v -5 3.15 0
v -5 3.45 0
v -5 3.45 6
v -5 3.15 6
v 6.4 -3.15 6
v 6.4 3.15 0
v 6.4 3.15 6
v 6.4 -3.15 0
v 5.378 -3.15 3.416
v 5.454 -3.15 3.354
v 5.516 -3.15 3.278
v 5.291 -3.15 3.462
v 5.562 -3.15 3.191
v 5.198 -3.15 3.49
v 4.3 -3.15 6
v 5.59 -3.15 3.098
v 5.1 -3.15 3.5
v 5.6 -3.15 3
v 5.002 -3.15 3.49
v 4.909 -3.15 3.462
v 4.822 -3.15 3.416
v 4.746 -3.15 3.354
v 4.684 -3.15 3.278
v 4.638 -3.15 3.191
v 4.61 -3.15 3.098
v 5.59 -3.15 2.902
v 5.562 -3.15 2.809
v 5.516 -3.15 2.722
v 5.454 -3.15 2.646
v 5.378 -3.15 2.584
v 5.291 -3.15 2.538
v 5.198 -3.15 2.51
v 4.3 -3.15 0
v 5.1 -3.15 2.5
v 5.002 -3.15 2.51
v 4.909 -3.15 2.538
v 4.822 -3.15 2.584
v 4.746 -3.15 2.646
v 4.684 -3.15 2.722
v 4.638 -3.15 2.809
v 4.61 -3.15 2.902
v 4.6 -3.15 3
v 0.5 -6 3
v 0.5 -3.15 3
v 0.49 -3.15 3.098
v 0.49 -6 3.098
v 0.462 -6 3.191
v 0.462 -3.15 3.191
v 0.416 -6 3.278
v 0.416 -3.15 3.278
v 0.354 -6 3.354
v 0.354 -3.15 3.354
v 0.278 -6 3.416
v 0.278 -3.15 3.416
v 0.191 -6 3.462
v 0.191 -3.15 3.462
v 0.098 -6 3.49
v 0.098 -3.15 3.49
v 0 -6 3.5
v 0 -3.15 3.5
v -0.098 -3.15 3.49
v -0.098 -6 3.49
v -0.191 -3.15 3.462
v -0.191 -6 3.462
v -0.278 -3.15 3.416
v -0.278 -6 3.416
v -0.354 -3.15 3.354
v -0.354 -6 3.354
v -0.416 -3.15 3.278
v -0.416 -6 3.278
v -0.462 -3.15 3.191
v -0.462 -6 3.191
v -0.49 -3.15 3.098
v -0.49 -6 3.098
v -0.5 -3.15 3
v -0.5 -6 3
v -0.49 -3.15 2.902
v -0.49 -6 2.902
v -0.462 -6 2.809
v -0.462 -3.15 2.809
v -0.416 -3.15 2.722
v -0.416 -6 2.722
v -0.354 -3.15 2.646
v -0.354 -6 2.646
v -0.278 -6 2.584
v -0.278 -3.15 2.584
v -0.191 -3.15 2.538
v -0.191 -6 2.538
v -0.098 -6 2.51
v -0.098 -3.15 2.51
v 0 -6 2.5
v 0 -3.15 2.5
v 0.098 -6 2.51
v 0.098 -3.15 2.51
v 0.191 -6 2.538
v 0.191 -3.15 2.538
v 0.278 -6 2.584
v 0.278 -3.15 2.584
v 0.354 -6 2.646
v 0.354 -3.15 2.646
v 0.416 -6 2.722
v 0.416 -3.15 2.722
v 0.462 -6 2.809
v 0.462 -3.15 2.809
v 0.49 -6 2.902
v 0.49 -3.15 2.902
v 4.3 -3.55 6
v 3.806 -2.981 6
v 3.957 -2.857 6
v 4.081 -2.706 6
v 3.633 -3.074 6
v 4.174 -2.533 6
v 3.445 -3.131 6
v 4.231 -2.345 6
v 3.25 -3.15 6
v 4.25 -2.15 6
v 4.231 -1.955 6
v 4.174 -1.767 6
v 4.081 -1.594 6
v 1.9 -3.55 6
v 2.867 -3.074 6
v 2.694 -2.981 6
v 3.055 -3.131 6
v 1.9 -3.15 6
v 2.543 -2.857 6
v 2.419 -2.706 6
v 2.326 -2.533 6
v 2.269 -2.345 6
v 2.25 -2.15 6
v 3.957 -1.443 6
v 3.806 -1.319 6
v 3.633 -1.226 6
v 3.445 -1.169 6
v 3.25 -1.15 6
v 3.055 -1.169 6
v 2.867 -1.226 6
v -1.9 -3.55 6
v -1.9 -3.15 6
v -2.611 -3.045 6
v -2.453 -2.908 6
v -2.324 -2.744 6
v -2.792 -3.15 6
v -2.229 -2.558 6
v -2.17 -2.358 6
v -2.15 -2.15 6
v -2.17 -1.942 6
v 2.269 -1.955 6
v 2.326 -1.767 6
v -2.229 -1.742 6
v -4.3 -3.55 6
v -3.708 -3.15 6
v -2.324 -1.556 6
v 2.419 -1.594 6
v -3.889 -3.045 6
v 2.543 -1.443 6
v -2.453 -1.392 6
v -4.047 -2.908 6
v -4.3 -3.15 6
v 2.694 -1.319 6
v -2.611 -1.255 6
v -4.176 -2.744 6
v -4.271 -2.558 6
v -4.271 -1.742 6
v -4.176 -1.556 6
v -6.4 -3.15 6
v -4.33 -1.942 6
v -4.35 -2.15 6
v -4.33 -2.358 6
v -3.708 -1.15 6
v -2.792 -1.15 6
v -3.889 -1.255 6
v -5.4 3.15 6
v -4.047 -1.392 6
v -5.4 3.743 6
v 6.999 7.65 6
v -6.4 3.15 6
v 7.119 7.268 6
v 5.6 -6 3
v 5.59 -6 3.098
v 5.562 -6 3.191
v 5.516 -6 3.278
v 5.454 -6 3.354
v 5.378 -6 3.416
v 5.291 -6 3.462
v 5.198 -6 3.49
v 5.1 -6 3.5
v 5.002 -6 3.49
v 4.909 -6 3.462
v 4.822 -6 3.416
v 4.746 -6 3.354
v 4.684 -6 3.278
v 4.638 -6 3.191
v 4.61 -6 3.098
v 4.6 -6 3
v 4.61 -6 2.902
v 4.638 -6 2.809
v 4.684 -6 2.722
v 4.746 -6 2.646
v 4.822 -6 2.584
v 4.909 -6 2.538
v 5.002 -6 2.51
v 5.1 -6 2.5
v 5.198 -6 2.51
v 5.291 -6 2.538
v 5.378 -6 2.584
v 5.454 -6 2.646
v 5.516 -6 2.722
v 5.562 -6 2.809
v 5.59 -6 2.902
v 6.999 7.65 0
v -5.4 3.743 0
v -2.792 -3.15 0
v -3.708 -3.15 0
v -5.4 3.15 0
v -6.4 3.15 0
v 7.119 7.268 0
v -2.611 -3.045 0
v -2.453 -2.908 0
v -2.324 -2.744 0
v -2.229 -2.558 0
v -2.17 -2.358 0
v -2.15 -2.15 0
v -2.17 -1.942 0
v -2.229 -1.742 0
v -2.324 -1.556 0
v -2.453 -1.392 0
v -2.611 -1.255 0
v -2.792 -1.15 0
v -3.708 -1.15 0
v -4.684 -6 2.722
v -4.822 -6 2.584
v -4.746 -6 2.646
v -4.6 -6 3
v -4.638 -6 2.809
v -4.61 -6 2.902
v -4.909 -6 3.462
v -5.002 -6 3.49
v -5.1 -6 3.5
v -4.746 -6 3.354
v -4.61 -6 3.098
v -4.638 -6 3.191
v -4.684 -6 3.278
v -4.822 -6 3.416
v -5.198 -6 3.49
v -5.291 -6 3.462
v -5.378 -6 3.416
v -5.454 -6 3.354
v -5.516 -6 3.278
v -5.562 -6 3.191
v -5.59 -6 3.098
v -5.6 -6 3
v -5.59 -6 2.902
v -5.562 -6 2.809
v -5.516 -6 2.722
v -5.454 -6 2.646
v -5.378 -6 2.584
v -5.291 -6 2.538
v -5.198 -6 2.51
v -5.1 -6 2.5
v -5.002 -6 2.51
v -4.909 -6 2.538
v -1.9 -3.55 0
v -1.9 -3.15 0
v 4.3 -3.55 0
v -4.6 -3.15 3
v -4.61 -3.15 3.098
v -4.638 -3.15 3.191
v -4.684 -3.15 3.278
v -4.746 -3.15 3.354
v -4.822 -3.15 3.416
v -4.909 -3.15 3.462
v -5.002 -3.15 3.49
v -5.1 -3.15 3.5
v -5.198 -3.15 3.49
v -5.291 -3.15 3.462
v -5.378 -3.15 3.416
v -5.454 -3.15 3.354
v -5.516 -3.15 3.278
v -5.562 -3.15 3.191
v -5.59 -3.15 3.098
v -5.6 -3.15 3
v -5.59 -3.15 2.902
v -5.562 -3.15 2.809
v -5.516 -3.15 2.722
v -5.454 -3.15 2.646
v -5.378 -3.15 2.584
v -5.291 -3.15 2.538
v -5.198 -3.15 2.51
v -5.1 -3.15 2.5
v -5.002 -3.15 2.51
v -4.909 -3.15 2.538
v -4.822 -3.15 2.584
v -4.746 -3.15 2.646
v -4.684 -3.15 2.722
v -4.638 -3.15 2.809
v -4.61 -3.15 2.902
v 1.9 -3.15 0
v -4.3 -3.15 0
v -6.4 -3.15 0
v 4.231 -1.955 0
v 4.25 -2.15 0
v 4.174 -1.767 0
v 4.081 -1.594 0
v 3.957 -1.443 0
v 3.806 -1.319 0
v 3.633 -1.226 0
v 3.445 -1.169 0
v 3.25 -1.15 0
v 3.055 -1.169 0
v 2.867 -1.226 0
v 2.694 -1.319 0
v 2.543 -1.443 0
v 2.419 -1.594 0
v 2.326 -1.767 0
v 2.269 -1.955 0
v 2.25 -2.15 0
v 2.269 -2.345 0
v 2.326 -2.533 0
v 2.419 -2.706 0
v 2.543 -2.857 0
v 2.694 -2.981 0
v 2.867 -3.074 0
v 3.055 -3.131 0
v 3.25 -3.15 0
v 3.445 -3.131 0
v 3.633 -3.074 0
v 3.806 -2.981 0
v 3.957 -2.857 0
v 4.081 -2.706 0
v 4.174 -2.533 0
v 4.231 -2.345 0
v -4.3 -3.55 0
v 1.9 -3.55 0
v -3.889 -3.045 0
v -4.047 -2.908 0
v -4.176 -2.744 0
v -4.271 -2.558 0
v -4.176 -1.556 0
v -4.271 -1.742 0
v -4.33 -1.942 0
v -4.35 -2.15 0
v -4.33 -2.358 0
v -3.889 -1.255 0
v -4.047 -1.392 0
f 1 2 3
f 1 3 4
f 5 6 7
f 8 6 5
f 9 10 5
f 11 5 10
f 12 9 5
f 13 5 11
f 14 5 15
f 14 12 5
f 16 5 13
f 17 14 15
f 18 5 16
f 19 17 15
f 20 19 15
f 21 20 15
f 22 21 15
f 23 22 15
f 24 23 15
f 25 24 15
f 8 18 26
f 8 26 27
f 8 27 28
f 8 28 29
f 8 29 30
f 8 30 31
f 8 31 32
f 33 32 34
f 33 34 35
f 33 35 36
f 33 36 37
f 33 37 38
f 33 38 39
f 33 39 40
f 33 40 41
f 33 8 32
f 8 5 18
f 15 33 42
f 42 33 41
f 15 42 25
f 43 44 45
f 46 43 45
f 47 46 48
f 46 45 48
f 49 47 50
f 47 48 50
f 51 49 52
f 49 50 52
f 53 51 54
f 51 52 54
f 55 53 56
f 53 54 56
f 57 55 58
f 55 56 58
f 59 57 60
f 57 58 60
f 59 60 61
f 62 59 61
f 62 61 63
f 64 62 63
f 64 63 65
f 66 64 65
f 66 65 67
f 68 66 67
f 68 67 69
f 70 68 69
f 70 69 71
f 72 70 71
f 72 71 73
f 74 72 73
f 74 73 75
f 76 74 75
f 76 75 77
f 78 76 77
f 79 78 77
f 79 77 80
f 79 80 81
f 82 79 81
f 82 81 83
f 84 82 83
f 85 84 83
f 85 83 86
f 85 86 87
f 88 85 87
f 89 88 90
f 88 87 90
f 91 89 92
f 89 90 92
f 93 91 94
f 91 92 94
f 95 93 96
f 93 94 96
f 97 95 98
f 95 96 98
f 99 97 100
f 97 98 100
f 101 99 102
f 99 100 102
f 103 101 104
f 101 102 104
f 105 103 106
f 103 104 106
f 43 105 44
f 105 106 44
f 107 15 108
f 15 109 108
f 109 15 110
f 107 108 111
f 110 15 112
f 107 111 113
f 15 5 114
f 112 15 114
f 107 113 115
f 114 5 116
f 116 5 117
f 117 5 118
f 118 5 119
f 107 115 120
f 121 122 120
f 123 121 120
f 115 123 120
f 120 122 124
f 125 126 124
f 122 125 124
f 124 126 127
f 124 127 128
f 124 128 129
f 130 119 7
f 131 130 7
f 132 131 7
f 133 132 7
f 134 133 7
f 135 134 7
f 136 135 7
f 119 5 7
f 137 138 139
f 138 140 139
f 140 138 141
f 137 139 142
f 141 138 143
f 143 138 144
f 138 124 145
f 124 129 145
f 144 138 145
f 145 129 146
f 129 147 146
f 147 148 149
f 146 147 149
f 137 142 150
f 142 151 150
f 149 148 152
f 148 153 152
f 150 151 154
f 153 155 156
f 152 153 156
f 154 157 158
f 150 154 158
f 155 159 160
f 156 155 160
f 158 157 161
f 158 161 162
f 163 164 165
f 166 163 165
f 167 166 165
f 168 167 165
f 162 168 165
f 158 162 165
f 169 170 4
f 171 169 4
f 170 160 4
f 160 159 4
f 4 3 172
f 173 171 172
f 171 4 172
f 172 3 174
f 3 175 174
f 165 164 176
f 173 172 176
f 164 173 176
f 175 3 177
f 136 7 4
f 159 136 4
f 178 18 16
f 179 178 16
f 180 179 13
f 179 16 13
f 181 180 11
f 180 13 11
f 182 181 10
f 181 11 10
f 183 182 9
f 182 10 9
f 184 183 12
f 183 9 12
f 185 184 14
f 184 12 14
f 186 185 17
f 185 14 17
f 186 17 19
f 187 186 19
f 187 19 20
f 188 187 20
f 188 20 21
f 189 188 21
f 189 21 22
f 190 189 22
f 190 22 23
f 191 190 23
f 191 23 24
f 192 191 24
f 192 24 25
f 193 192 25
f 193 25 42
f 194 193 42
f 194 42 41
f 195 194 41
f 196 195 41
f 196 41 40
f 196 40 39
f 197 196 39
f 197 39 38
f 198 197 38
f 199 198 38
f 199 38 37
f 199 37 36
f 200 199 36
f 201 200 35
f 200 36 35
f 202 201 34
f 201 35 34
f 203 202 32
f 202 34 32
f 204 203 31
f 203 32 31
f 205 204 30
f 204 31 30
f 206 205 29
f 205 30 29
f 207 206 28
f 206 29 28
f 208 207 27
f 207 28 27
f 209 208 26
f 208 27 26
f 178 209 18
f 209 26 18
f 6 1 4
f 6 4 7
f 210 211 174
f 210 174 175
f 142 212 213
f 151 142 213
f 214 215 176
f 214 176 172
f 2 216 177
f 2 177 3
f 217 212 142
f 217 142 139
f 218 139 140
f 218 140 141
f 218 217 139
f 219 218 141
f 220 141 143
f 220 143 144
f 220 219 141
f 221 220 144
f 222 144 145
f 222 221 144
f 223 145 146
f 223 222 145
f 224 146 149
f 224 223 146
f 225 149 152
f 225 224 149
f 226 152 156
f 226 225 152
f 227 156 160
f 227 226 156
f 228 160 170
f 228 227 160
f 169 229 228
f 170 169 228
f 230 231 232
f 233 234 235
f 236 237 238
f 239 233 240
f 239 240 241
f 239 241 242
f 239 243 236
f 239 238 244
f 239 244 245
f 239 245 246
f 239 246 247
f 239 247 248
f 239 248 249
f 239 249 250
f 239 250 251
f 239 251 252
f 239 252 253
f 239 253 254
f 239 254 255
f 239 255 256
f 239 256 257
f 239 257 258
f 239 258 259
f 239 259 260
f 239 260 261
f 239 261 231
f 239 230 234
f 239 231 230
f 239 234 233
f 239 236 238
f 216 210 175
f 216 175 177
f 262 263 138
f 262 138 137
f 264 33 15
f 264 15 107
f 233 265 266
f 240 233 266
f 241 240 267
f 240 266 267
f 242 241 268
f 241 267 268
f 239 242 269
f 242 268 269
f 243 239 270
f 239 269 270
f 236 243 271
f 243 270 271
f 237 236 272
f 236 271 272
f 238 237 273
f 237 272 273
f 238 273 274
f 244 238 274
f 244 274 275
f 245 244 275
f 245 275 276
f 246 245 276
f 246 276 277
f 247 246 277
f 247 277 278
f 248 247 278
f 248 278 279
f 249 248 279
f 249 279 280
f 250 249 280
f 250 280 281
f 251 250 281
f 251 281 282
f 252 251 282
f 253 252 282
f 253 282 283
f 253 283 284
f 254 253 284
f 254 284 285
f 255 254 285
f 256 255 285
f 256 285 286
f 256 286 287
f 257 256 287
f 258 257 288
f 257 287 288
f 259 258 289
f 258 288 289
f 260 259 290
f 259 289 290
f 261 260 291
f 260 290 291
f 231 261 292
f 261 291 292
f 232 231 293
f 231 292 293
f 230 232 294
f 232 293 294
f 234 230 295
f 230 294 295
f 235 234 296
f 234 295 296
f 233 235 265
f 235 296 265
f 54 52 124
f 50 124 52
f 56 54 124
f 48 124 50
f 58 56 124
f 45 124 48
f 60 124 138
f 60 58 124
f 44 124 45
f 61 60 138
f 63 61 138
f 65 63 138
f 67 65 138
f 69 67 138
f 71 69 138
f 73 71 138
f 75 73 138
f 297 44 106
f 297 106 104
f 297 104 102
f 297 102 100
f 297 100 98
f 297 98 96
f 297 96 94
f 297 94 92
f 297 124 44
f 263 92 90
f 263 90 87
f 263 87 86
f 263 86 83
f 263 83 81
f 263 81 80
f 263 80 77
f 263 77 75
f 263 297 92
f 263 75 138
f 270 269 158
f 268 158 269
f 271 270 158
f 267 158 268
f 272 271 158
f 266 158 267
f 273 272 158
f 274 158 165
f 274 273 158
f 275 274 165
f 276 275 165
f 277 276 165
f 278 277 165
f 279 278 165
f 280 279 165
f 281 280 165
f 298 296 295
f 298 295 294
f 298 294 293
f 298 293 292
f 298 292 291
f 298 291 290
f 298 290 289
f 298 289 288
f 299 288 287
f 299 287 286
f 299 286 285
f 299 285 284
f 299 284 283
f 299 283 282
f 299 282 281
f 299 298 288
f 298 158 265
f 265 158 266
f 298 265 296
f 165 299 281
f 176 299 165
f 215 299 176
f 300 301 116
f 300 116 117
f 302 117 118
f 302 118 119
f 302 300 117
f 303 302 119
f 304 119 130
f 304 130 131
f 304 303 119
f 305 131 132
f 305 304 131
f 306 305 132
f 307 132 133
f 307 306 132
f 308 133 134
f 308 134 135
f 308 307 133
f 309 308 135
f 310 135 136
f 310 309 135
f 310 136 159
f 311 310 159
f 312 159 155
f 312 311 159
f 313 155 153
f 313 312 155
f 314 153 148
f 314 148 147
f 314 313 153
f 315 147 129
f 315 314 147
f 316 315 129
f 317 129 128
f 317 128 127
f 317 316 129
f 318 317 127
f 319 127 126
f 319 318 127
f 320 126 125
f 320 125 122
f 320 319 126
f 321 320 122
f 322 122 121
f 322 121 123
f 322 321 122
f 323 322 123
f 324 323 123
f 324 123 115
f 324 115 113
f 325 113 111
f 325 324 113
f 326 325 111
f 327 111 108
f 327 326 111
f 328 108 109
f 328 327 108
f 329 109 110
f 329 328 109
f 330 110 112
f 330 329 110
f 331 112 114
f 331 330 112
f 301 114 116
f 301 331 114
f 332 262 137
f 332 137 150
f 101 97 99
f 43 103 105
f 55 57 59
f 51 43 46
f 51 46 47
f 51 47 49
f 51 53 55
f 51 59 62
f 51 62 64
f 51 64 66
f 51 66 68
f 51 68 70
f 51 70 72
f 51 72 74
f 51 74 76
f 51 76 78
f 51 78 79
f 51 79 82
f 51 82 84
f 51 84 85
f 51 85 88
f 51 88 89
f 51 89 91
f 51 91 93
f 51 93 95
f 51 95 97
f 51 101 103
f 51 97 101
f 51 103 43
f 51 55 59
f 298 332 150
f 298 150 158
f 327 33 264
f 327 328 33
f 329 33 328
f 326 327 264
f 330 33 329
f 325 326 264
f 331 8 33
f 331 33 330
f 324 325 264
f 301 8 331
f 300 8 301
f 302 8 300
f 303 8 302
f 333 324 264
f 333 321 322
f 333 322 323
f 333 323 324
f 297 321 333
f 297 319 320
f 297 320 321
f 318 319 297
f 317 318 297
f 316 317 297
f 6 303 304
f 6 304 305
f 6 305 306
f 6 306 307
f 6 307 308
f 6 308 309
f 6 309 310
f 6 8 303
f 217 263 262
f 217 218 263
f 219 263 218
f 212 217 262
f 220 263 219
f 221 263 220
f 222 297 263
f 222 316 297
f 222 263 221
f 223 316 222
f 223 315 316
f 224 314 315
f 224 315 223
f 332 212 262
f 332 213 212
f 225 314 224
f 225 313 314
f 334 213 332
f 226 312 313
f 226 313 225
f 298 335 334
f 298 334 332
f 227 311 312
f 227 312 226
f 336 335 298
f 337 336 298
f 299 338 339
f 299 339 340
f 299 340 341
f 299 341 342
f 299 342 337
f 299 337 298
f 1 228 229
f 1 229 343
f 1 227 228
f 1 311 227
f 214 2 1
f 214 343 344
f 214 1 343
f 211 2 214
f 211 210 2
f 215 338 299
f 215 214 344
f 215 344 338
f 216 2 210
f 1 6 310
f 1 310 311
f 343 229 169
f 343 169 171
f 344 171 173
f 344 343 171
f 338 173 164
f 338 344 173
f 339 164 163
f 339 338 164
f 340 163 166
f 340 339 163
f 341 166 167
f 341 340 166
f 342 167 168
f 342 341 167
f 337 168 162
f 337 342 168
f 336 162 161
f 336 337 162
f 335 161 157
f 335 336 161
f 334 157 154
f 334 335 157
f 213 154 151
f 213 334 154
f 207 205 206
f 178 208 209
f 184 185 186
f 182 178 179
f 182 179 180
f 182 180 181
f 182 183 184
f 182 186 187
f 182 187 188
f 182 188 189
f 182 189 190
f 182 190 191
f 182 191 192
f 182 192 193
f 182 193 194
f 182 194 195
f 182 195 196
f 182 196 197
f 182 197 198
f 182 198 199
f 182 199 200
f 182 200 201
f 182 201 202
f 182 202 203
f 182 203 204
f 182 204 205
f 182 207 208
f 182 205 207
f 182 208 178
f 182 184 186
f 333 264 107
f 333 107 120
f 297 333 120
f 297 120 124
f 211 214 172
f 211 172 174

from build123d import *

# Parameters (mm, degrees)
SKETCH001_R         = 1
PAD001_DEPTH        = 6
CYLINDER003_R       = 0.5
CYLINDER003_DEPTH   = 3
LINEARPATTERN_COUNT = 3
LINEARPATTERN_PITCH = 5.1


with BuildPart() as part:
    # Sketch001 → Pad001 (new body)
    with BuildSketch(Plane.XY):
        Polygon((6.4, 3.15), (6.4, -3.15), (4.3, -3.15), (4.3, -3.55), (1.9, -3.55), (1.9, -3.15), (-1.9, -3.15), (-1.9, -3.55), (-4.3, -3.55), (-4.3, -3.15), (-6.4, -3.15), (-6.4, 3.15), (-5.4, 3.15), (-5.4, 3.743355), (6.999118, 7.65), (7.119322, 7.268489), (-5, 3.45), (-5, 3.15), align=None)
        with Locations((3.25, -2.15)):
            Circle(SKETCH001_R, mode=Mode.SUBTRACT)
        with BuildLine():
            ThreePointArc((-3.708258, -1.15), (-4.35, -2.15), (-3.708258, -3.15))
            Line((-2.791742, -3.15), (-3.708258, -3.15))
            ThreePointArc((-2.791742, -3.15), (-2.15, -2.15), (-2.791742, -1.15))
            Line((-3.708258, -1.15), (-2.791742, -1.15))
        make_face(mode=Mode.SUBTRACT)
    extrude(amount=PAD001_DEPTH)

    # Cylinder003 → Cylinder003 (join)
    with BuildSketch(Plane(origin=(-5.1, -3, 3), x_dir=(1, 0, 0), z_dir=(0, -1, 0))):
        Circle(CYLINDER003_R)
    cylinder003 = extrude(amount=CYLINDER003_DEPTH)

    # LinearPattern: Cylinder003 ×3
    with Locations(*[(i * LINEARPATTERN_PITCH, 0, 0) for i in range(1, LINEARPATTERN_COUNT)]):
        add(cylinder003)


solid = part.part
